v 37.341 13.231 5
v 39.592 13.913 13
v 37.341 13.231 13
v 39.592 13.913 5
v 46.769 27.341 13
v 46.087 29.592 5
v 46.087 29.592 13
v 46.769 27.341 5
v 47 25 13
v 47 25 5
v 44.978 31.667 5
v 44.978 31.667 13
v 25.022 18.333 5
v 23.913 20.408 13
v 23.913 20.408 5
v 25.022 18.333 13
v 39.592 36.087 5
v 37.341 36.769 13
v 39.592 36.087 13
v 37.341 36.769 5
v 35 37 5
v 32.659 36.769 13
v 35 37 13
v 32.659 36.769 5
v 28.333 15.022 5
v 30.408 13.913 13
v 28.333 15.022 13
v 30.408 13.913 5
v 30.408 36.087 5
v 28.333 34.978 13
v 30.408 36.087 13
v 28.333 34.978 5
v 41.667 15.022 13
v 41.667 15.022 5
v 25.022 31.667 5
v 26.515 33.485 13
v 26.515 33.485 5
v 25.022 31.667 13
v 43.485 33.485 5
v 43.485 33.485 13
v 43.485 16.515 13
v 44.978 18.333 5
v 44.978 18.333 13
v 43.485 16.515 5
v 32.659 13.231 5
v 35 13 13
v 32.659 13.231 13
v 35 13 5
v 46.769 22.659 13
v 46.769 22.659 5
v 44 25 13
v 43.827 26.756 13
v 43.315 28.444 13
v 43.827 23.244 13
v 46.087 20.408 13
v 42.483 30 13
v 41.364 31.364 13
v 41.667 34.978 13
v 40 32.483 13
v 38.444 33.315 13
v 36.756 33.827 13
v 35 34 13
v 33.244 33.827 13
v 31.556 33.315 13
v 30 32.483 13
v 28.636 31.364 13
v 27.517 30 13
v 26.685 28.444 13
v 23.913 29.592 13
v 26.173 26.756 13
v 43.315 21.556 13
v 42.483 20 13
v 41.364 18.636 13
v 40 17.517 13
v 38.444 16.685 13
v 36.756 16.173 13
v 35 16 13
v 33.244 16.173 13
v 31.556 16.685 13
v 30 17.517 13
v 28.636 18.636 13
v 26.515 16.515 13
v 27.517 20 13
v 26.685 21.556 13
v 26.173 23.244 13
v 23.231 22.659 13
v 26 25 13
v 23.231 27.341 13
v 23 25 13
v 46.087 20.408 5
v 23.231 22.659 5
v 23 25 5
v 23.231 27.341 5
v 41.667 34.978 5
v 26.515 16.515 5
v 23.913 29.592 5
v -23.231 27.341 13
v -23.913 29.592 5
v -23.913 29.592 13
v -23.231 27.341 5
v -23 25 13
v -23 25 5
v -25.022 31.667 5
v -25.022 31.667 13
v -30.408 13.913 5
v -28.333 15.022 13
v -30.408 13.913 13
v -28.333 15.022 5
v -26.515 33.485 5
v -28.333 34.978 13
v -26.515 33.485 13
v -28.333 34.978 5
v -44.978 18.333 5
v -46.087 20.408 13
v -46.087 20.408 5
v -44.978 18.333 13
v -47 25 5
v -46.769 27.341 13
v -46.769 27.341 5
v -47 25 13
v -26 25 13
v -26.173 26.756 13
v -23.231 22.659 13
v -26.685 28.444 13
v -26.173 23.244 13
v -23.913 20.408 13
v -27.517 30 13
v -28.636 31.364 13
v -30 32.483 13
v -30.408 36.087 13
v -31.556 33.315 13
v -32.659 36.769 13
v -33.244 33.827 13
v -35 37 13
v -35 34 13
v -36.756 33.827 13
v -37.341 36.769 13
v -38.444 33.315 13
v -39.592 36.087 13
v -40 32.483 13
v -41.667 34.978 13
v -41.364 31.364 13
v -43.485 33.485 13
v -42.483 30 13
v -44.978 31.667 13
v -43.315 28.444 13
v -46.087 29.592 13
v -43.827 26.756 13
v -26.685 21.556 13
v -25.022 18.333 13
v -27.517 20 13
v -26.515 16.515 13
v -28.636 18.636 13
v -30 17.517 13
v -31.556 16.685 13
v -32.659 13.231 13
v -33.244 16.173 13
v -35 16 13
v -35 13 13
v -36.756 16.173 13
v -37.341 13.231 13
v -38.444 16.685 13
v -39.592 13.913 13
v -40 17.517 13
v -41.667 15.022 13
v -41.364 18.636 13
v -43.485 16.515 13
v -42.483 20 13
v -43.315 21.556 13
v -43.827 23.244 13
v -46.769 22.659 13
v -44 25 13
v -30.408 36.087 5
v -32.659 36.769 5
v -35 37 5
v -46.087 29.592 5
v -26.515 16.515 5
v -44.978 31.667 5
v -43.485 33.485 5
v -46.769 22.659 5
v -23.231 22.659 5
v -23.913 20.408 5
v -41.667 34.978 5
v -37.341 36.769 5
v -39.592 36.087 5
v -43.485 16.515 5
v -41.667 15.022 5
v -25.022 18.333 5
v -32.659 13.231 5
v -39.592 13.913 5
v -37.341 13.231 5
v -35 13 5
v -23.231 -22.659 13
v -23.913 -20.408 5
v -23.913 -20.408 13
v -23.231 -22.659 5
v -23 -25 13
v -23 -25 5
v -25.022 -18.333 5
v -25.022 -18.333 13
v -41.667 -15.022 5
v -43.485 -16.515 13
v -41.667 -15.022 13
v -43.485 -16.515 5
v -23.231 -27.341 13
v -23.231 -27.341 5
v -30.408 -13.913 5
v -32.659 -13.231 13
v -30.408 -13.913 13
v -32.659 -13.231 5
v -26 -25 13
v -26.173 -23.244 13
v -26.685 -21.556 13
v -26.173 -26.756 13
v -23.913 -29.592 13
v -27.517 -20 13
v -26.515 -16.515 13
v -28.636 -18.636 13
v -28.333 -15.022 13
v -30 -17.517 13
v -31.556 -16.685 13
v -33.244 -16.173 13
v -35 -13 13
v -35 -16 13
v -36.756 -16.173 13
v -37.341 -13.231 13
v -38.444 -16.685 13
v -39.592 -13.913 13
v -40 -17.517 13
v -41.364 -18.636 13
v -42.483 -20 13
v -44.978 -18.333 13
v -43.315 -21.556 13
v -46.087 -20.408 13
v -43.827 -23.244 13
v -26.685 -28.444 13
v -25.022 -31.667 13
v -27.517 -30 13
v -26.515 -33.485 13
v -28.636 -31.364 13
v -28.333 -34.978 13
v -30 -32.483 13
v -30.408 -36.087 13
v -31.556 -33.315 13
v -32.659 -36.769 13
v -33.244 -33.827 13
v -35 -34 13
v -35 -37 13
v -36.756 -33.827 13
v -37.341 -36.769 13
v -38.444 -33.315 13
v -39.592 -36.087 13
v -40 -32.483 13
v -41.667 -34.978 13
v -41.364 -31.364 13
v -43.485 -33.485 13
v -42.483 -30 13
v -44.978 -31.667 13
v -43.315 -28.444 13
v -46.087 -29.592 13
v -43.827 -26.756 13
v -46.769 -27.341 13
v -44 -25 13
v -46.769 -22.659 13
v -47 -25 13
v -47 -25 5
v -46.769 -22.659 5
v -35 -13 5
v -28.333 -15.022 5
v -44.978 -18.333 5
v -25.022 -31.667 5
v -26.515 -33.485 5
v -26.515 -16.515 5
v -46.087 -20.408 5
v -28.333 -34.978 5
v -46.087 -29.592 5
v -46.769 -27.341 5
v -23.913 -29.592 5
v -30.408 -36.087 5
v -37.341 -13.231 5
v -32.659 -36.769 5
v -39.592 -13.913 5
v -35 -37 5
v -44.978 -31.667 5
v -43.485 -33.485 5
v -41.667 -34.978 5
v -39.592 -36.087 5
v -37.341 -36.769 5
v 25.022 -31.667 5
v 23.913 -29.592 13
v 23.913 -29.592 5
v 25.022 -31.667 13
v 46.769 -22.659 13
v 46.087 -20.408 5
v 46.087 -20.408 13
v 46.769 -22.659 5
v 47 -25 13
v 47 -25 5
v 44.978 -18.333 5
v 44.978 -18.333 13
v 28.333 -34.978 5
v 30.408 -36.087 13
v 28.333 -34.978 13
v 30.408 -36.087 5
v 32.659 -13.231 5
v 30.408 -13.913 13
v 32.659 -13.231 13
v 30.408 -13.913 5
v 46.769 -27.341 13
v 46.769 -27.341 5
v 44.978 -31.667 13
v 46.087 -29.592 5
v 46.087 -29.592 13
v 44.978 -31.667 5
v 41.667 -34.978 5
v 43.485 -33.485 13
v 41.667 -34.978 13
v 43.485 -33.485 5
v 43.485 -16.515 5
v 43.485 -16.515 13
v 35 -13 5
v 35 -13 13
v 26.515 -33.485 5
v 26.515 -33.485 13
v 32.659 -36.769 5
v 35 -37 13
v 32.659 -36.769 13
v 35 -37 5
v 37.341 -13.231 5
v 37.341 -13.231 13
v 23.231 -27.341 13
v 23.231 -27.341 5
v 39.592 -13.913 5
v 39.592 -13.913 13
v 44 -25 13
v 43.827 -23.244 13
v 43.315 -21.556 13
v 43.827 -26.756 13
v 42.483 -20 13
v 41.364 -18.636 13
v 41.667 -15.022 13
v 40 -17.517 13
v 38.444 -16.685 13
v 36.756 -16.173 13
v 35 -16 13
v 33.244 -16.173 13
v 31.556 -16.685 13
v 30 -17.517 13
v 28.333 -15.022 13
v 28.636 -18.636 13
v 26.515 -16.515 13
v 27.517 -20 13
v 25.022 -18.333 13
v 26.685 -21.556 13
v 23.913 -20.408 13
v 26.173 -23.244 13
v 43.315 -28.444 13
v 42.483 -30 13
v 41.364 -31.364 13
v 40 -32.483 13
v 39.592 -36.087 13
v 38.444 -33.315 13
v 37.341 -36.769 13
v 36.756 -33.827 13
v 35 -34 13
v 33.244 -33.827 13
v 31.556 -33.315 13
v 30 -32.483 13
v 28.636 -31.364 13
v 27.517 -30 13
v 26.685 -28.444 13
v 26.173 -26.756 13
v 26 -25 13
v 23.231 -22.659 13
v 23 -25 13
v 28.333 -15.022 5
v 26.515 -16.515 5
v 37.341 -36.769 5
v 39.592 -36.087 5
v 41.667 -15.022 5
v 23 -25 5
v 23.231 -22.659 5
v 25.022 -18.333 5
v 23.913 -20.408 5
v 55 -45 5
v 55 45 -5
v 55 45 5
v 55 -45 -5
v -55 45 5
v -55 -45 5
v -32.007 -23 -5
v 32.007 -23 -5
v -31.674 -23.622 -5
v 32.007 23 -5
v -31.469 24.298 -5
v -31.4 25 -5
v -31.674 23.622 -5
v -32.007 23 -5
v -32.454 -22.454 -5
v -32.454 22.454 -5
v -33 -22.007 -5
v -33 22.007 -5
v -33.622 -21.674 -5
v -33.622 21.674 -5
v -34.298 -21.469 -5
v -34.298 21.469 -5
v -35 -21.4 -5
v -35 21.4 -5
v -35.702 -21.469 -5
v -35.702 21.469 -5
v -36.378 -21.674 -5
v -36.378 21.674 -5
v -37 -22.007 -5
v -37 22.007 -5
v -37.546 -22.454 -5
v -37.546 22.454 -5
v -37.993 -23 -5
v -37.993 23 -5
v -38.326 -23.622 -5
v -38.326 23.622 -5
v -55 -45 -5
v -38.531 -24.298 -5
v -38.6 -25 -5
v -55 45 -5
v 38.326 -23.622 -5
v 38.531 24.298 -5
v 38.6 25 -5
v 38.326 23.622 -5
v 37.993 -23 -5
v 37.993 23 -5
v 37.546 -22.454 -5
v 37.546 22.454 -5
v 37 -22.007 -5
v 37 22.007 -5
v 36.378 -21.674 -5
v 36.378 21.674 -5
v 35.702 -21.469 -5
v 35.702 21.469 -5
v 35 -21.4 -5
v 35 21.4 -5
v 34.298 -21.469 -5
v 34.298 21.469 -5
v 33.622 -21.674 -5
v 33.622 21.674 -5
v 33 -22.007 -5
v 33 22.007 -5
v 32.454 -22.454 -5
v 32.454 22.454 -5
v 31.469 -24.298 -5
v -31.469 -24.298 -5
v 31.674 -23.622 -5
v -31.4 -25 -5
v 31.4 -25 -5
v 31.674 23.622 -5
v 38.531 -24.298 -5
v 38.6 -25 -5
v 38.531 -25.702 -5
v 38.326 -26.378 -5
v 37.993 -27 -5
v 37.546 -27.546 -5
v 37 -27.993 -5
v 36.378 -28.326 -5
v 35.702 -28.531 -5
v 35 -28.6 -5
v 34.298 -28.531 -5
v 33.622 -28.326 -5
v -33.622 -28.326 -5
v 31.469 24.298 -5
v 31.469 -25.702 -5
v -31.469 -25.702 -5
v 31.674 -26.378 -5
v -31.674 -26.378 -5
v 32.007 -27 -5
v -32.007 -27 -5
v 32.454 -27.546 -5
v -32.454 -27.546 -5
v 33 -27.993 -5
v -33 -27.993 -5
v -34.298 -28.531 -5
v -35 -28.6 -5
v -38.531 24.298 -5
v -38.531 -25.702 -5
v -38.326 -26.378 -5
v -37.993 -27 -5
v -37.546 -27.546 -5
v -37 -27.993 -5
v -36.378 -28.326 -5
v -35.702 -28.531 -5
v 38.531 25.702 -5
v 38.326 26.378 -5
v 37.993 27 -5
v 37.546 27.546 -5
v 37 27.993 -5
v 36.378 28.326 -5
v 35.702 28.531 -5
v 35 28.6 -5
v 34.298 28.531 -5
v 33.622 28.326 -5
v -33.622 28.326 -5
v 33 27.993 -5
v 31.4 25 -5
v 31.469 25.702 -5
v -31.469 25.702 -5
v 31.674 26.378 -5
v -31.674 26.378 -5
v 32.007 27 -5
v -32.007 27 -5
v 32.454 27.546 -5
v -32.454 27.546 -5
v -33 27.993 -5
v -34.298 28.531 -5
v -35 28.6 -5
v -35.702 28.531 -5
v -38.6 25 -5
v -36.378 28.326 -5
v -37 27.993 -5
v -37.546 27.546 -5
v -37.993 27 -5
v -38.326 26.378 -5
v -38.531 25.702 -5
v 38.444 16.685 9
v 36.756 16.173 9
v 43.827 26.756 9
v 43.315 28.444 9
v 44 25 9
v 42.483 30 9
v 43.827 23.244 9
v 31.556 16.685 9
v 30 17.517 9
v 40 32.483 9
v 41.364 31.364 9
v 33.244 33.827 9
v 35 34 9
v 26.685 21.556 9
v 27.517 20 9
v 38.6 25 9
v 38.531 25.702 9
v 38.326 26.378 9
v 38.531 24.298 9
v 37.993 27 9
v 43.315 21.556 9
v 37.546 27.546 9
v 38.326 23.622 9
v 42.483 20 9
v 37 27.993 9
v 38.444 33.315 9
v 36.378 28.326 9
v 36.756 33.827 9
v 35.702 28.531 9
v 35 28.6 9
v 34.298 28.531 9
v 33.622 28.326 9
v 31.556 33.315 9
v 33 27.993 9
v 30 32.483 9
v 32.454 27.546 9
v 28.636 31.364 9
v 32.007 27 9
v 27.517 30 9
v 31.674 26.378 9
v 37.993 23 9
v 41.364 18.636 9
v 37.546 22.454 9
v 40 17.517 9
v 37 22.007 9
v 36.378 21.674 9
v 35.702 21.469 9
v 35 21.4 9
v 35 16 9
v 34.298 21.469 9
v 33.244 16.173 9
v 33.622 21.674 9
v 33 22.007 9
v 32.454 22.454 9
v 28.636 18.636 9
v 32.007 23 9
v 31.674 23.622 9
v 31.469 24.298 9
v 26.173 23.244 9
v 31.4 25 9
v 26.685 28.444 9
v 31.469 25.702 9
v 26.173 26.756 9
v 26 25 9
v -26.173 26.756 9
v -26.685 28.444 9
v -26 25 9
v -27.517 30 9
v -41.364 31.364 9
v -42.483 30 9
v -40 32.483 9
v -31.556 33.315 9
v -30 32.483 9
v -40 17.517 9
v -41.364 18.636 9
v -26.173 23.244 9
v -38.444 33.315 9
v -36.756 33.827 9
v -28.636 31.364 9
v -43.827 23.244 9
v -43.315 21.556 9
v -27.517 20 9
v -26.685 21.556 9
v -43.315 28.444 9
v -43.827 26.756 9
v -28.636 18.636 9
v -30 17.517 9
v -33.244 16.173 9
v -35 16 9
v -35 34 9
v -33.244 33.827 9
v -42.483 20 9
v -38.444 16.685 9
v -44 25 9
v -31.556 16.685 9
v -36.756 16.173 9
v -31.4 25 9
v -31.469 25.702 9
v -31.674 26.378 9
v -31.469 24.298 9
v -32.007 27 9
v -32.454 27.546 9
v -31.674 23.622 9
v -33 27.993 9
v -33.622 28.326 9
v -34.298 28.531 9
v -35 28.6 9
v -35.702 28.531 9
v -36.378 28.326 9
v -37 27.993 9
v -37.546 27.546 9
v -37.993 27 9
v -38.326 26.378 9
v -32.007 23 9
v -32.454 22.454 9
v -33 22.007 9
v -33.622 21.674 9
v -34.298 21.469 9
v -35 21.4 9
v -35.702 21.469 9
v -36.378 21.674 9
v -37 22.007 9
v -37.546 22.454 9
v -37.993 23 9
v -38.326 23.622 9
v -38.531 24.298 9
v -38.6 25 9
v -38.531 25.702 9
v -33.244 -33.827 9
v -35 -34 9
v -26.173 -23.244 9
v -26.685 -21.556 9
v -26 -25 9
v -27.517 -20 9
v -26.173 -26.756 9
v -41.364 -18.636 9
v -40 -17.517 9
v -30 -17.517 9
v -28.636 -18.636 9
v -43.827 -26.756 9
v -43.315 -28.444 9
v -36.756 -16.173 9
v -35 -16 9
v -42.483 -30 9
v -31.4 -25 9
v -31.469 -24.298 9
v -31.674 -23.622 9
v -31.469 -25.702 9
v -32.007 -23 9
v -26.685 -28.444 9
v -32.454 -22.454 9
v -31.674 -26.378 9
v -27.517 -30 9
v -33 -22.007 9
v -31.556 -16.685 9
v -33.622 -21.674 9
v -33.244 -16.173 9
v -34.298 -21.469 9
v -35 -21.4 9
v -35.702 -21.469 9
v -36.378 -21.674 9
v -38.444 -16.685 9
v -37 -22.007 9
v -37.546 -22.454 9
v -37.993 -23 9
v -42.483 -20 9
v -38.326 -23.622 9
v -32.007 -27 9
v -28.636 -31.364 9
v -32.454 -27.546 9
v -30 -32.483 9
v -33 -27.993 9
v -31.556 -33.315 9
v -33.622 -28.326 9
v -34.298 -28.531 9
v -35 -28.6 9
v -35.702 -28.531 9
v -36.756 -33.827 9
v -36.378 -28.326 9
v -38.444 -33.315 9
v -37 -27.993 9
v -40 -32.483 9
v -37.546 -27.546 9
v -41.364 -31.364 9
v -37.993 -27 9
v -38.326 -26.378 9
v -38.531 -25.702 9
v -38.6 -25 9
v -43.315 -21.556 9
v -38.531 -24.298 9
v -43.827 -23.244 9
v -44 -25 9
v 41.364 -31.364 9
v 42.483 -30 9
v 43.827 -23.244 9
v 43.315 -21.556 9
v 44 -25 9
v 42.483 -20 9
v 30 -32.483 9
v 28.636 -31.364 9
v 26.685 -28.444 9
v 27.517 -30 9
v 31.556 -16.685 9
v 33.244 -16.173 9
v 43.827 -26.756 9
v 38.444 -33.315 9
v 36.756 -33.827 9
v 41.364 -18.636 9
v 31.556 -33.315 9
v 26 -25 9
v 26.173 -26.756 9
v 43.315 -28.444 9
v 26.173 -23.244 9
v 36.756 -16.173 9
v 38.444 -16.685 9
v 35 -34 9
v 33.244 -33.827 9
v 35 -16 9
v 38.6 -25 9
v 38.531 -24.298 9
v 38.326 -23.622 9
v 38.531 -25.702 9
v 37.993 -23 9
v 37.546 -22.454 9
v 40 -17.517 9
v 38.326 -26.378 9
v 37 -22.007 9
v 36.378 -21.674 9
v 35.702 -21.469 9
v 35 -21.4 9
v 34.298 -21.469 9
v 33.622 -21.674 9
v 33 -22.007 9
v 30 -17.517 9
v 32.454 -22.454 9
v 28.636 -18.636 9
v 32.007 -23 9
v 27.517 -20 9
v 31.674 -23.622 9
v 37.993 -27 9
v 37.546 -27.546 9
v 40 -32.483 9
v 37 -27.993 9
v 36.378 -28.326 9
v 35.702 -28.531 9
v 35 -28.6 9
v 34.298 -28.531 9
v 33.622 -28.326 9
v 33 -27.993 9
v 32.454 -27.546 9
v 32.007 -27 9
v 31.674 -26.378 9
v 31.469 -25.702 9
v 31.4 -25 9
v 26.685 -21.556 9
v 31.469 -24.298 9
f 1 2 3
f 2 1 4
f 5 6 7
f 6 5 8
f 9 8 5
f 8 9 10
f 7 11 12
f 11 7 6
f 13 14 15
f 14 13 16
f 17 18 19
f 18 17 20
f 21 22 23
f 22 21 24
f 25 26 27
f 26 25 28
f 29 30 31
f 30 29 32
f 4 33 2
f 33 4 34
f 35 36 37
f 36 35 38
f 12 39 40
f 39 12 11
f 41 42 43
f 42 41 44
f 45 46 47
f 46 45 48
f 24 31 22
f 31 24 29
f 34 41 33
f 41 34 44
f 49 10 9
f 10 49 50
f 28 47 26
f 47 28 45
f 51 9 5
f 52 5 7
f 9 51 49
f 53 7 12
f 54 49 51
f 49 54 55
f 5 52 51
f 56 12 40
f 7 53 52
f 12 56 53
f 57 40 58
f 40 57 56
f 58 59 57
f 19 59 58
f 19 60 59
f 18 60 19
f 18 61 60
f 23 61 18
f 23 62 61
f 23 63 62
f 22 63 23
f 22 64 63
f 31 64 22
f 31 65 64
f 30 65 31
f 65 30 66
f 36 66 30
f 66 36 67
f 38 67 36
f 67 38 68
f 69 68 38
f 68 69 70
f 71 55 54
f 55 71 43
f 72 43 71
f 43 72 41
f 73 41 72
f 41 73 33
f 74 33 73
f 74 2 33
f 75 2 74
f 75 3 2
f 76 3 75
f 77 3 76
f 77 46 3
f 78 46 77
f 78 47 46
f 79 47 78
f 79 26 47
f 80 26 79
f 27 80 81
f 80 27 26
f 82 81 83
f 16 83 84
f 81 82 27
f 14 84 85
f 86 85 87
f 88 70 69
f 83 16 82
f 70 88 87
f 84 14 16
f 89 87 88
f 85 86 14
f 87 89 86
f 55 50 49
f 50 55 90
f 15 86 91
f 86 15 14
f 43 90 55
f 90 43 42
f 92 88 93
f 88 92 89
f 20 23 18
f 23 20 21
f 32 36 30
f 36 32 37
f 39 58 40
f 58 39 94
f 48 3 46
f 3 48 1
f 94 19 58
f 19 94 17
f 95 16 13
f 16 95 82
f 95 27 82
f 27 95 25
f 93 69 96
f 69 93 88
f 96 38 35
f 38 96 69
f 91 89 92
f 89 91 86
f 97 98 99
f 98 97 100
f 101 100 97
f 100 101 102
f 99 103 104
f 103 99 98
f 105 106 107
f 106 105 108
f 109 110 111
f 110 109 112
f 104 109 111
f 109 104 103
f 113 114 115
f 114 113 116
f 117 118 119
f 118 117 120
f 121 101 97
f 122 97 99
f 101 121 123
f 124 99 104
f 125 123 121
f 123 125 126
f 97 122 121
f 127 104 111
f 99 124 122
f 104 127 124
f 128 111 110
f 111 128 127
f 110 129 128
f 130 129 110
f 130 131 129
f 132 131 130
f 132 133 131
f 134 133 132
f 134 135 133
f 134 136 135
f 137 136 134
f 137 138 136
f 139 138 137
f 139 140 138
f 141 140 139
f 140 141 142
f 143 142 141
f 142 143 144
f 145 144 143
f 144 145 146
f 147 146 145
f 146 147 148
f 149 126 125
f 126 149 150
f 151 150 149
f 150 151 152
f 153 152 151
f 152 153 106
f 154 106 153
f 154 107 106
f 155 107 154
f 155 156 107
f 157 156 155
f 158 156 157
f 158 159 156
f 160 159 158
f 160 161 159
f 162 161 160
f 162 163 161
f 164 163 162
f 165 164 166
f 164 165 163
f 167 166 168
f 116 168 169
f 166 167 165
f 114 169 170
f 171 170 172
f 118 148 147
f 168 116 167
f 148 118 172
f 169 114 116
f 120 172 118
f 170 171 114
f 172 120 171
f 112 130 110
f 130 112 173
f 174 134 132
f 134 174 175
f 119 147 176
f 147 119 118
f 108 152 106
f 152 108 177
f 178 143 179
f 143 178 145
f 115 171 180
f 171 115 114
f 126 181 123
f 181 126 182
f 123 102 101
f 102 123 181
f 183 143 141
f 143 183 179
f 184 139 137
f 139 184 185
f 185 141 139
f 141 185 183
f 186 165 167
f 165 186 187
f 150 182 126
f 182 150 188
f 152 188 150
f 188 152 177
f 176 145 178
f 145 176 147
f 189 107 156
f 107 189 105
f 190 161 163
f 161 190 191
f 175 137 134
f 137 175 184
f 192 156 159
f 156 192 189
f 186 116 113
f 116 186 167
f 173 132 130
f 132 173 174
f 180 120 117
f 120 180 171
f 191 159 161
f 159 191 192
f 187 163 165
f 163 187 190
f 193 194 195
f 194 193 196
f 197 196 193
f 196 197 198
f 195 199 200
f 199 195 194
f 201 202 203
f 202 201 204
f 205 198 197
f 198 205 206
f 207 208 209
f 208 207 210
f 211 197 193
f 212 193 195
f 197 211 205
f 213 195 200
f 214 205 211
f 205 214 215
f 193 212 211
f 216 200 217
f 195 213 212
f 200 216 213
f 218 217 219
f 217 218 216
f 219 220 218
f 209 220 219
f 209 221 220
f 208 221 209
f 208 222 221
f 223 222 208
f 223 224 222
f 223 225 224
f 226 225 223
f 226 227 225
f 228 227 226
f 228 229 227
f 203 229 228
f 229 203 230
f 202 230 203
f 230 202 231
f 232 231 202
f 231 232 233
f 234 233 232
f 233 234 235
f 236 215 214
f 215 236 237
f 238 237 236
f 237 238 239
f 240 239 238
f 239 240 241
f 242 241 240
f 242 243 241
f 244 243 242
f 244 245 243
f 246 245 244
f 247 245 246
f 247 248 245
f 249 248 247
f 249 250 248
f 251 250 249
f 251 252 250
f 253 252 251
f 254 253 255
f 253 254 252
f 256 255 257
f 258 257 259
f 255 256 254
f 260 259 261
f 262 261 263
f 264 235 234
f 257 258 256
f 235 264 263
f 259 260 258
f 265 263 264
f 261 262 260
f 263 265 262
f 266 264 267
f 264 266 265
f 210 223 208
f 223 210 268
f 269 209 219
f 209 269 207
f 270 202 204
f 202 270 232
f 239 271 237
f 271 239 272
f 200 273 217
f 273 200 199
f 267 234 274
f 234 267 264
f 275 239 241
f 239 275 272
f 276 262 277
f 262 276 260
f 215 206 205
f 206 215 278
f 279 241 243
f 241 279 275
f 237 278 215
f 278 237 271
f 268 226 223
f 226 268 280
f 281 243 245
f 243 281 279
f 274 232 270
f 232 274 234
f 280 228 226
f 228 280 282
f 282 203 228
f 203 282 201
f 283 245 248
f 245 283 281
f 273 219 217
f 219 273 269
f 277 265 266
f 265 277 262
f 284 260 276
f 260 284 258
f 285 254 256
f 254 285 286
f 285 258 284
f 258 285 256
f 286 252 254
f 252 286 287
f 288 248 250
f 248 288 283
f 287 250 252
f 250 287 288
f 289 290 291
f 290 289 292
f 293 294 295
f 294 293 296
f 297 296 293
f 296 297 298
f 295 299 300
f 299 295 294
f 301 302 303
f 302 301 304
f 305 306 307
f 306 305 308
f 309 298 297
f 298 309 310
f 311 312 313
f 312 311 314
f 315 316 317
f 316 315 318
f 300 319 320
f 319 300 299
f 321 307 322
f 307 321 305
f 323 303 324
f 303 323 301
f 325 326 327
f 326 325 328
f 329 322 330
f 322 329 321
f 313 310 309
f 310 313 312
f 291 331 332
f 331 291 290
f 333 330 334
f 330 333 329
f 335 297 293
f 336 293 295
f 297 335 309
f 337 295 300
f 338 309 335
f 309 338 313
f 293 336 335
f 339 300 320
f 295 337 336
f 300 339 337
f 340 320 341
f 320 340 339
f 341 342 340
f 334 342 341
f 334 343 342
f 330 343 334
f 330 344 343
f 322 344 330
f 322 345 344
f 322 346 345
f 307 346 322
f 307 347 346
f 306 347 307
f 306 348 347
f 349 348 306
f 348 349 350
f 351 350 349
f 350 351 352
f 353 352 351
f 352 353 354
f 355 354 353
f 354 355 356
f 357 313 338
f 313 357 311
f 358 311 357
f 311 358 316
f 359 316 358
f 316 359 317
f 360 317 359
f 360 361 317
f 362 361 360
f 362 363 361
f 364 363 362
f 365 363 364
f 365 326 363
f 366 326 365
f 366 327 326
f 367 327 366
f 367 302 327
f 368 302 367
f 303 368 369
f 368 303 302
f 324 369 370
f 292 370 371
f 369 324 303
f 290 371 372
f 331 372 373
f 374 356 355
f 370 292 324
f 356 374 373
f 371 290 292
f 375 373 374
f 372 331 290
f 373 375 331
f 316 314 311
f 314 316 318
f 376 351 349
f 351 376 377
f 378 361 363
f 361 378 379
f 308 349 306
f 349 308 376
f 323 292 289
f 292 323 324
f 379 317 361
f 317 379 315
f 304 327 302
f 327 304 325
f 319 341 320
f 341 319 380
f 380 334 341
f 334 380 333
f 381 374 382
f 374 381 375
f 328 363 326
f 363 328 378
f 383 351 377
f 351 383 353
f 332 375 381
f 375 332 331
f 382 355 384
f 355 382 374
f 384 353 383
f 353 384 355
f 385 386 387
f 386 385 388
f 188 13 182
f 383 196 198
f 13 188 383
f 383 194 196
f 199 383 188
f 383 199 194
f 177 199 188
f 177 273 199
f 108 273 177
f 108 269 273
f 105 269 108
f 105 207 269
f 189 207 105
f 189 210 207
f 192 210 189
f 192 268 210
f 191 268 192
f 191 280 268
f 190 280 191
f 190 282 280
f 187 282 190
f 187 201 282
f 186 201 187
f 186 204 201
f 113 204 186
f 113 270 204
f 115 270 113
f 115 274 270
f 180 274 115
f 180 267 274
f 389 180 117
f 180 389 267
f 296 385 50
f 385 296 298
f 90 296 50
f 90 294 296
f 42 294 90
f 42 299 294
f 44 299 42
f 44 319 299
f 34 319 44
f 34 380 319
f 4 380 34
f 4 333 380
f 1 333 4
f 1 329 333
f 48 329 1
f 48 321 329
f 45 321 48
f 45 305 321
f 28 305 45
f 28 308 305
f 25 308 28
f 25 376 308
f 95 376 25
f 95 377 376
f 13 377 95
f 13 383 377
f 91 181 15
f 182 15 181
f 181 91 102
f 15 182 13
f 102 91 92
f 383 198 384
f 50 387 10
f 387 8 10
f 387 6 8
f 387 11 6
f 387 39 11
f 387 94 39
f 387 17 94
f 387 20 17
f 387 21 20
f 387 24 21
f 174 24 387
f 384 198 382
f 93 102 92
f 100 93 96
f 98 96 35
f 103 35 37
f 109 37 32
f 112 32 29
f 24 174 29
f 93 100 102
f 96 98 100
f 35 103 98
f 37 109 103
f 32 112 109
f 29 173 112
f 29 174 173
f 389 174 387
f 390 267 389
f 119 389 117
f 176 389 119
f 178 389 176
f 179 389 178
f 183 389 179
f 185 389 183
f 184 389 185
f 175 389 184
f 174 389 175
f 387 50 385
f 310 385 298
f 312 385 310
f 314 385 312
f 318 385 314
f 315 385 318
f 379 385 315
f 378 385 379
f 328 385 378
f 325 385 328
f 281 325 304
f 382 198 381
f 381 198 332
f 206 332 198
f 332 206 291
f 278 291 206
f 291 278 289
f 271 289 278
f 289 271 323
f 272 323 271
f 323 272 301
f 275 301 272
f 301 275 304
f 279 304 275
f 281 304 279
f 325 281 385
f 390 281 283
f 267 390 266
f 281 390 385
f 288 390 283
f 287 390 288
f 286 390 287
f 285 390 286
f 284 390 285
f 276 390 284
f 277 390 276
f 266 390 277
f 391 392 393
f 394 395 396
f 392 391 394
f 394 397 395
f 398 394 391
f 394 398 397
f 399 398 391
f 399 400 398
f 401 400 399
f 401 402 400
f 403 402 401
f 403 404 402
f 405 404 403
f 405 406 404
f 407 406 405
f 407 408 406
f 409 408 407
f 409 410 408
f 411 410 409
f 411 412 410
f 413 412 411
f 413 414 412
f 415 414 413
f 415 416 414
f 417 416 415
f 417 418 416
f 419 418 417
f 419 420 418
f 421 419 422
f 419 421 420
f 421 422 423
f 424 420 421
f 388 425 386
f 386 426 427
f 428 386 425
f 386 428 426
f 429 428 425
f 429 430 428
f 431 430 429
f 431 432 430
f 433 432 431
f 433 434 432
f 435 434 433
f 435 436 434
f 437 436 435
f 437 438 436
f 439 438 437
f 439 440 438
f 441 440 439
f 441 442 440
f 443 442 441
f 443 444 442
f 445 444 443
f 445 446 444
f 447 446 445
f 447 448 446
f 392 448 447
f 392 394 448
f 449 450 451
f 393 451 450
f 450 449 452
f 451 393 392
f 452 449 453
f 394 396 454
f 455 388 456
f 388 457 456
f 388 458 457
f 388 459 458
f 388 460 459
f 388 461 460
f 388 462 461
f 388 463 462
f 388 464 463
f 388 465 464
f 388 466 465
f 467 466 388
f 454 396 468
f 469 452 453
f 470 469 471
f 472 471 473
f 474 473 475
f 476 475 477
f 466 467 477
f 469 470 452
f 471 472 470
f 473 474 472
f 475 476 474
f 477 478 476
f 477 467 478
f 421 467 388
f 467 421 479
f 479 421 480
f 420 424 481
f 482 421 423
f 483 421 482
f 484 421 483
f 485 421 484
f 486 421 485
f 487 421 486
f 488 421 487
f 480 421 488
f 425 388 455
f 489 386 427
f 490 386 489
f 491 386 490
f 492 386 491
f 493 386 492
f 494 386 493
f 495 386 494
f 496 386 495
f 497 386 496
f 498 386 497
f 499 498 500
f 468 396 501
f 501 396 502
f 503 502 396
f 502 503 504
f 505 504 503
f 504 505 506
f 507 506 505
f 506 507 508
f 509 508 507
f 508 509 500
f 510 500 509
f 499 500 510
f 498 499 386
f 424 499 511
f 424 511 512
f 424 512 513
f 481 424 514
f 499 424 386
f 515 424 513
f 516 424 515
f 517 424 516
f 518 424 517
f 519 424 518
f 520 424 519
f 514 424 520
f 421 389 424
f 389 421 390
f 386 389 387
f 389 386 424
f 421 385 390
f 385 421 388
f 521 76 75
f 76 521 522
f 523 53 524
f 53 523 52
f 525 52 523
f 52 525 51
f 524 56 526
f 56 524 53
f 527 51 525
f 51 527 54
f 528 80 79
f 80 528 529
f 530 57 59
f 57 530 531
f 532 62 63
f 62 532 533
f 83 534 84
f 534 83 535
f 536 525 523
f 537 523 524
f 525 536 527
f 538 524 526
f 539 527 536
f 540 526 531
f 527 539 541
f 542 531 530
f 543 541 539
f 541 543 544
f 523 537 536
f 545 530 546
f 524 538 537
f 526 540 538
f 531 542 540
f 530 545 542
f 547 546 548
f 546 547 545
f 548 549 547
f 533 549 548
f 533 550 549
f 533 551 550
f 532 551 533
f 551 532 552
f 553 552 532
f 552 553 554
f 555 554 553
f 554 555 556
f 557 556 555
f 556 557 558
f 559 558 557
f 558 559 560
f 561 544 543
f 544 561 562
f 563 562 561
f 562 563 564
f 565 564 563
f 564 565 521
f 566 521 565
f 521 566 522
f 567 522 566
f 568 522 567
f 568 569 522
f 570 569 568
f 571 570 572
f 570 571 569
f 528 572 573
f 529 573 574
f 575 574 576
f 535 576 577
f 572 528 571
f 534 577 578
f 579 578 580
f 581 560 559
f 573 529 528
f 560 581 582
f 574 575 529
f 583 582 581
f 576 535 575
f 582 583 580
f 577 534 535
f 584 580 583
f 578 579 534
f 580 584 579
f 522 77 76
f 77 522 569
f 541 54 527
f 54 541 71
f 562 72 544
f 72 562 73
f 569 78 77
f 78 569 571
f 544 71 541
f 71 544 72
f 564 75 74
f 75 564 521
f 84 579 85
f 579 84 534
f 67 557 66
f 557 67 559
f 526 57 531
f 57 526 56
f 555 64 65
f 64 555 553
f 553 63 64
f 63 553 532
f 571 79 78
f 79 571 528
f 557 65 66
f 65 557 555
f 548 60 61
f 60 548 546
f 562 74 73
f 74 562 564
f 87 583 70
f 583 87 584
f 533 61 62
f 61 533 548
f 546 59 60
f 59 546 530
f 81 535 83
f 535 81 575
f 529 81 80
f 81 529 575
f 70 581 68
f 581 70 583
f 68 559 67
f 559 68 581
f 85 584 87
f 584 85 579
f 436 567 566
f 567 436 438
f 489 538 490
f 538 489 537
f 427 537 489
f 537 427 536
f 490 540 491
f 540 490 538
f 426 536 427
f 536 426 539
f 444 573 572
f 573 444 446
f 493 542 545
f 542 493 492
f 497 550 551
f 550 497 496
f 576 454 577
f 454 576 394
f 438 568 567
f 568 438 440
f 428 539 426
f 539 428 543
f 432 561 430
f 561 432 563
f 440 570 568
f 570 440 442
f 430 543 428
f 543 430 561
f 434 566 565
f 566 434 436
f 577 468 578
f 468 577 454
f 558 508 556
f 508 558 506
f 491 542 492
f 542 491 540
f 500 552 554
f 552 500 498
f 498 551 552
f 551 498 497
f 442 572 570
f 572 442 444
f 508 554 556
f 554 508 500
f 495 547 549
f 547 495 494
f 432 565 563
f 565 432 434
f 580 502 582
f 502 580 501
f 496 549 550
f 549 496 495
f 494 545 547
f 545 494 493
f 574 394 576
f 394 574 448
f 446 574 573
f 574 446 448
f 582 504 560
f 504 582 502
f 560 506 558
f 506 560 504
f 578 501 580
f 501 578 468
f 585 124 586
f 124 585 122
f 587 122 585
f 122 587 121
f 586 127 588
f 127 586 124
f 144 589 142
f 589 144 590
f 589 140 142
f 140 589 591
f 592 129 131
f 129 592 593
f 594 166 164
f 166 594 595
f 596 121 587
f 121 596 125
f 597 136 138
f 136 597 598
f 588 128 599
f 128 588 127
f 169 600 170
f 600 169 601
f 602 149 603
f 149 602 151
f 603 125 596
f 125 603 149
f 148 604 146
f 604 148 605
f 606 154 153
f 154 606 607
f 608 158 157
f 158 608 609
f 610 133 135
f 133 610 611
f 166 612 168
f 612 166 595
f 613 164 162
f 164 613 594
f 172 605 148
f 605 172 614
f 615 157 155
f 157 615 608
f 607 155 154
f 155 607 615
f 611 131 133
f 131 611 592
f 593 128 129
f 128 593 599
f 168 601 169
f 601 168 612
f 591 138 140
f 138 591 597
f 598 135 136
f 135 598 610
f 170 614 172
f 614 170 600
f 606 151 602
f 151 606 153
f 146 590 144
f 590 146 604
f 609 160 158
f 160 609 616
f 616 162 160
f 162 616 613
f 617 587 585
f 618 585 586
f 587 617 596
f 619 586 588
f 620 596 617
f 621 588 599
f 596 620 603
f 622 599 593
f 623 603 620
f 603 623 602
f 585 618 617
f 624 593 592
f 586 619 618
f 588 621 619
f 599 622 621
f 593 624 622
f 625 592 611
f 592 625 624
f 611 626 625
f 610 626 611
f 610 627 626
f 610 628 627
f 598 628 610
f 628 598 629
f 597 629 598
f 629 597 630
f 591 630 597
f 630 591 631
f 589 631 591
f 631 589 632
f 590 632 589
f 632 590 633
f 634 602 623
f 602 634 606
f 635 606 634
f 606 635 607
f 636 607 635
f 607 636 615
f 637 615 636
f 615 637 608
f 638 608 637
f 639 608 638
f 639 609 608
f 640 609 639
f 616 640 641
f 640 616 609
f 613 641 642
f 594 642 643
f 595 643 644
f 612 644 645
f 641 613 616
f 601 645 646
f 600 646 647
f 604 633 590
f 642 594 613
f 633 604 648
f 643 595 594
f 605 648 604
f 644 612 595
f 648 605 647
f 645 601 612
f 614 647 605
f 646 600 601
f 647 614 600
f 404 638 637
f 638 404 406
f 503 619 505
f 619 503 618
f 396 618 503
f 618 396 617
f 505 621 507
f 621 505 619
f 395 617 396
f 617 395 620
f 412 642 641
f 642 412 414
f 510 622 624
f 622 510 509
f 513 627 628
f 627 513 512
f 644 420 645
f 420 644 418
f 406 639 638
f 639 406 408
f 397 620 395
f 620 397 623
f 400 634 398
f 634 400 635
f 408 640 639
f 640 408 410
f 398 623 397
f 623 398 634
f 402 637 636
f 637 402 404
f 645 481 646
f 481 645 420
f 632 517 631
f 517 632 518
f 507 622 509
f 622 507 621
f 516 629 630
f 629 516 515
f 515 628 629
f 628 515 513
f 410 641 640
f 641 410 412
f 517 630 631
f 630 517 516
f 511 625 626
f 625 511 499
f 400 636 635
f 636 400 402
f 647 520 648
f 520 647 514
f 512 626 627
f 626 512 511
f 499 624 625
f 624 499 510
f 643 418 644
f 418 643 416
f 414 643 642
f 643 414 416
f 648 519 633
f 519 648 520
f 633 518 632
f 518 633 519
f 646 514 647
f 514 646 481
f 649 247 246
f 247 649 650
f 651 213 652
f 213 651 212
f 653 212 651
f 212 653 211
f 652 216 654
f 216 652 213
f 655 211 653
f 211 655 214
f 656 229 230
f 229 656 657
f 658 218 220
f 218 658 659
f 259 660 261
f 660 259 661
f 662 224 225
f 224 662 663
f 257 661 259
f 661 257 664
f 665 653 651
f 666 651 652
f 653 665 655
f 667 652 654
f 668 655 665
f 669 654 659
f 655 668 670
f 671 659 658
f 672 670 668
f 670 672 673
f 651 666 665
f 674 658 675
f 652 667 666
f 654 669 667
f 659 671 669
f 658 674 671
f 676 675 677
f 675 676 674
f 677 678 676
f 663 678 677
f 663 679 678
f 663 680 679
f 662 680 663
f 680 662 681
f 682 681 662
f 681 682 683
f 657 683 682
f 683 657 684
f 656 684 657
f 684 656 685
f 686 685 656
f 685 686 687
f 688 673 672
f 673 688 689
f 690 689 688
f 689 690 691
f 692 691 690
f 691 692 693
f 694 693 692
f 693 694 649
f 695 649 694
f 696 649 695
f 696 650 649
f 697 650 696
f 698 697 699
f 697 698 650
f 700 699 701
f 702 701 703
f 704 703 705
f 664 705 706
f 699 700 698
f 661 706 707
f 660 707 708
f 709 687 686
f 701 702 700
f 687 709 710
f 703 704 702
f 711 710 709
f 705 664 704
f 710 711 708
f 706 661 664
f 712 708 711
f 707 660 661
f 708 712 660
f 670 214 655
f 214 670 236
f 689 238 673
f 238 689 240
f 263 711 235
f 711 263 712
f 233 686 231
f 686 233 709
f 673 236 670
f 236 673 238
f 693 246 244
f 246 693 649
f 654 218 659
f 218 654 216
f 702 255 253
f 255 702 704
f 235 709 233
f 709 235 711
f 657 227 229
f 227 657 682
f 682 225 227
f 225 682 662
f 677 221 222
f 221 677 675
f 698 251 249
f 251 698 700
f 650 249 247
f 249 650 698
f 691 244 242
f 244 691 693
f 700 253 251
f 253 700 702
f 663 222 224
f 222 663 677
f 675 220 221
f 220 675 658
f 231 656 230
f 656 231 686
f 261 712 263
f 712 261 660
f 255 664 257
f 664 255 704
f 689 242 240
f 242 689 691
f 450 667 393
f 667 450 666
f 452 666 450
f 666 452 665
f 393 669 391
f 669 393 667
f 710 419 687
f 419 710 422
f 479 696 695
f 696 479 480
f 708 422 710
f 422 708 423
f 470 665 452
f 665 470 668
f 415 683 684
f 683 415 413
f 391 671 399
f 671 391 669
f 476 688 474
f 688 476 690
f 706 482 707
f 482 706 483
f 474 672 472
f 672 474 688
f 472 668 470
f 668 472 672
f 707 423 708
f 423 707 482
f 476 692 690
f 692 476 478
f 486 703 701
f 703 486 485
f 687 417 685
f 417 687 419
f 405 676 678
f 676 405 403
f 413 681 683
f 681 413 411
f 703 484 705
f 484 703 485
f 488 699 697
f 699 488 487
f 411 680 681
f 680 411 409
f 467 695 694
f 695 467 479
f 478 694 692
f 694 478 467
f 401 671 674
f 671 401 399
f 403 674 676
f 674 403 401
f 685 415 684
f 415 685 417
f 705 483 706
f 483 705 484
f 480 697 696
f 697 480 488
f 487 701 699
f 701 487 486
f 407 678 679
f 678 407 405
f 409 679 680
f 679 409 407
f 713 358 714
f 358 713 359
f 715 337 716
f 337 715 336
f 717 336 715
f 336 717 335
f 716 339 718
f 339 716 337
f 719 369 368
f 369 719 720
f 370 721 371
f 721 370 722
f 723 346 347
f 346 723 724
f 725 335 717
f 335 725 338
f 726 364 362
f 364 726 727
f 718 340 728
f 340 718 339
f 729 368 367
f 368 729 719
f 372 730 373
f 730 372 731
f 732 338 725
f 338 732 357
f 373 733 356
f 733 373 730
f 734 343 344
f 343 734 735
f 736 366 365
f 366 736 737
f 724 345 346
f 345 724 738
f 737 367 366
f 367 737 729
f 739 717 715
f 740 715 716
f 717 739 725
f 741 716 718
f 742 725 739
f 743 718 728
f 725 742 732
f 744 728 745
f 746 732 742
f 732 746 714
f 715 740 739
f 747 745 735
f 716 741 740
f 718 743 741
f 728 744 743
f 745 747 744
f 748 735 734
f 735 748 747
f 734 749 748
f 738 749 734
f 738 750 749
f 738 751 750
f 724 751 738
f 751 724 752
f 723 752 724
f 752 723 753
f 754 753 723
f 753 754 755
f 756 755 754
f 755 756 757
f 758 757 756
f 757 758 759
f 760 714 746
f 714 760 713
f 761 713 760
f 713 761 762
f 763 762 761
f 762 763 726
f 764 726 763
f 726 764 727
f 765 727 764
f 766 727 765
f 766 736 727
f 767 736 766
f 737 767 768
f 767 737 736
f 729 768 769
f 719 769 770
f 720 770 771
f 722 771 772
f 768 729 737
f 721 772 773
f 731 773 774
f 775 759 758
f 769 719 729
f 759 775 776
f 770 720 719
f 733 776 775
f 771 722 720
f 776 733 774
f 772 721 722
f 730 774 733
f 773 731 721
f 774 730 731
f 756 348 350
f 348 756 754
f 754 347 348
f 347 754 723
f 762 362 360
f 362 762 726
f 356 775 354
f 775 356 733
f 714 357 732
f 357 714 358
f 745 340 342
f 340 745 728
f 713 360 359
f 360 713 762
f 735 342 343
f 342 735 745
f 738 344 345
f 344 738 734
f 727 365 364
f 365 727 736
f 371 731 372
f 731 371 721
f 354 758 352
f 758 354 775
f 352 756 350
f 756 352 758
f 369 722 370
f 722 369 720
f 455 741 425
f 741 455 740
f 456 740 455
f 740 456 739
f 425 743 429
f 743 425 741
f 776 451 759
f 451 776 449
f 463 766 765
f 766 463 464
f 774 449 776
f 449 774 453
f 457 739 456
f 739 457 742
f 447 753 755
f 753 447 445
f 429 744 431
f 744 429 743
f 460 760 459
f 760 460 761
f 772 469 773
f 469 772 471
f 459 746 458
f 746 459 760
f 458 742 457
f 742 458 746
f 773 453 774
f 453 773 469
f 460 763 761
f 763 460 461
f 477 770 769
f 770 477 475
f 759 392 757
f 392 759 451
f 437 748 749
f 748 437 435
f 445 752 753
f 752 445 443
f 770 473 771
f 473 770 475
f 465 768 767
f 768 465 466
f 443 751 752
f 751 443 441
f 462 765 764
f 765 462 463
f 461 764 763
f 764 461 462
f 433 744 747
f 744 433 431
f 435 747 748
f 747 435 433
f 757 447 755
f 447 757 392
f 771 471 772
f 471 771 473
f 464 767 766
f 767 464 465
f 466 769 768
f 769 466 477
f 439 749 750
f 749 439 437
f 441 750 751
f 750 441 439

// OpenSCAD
$fn = 32;

// ----------------------------------------------------------------------
// Socket pad plate
// bosses with counterbored sockets for the screws
// ----------------------------------------------------------------------

// --- parameters (mm) ---
base_t = 10;            // base plate thickness
boss_h = 8;             // boss height above the base plate
boss_d = 24;            // boss diameter
socket_d = 18;          // socket diameter
socket_depth = 4;       // socket depth from the boss face
bolt_d = 7.2;           // screw clearance hole through the socket floor
plate = [110, 90, 10];  // overall size (x, y, z)
edge = 20;              // boss centre offset from the plate edge
pads = 4;               // boss count, one per corner

// --- derived feature positions (mm) ---
height = base_t + boss_h;        // = 18   overall height of the part
corner_x = plate[0] / 2 - edge;  // = 35   boss centre X
corner_y = plate[1] / 2 - edge;  // = 25   boss centre Y
feature_centers = [
  [corner_x, corner_y],
  [-corner_x, corner_y],
  [-corner_x, -corner_y],
  [corner_x, -corner_y]
];   // boss centres: sockets, holes and the pads themselves are placed from here

// base plate, bosses on feature_centers, socket + through hole in each
difference() {
  union() {
    cube(plate, center = true);
    for (centre = feature_centers)
      translate([centre[0], centre[1], plate[2] / 2 - 1])
        cylinder(d = boss_d, h = boss_h + 1);
  }
  for (centre = feature_centers) {
    translate([centre[0], centre[1], plate[2] / 2 + boss_h - socket_depth])
      cylinder(d = socket_d, h = socket_depth + 1);
    translate([centre[0], centre[1], -height])
      cylinder(d = bolt_d, h = 2 * height + 2);  // through the socket floor
  }
}
